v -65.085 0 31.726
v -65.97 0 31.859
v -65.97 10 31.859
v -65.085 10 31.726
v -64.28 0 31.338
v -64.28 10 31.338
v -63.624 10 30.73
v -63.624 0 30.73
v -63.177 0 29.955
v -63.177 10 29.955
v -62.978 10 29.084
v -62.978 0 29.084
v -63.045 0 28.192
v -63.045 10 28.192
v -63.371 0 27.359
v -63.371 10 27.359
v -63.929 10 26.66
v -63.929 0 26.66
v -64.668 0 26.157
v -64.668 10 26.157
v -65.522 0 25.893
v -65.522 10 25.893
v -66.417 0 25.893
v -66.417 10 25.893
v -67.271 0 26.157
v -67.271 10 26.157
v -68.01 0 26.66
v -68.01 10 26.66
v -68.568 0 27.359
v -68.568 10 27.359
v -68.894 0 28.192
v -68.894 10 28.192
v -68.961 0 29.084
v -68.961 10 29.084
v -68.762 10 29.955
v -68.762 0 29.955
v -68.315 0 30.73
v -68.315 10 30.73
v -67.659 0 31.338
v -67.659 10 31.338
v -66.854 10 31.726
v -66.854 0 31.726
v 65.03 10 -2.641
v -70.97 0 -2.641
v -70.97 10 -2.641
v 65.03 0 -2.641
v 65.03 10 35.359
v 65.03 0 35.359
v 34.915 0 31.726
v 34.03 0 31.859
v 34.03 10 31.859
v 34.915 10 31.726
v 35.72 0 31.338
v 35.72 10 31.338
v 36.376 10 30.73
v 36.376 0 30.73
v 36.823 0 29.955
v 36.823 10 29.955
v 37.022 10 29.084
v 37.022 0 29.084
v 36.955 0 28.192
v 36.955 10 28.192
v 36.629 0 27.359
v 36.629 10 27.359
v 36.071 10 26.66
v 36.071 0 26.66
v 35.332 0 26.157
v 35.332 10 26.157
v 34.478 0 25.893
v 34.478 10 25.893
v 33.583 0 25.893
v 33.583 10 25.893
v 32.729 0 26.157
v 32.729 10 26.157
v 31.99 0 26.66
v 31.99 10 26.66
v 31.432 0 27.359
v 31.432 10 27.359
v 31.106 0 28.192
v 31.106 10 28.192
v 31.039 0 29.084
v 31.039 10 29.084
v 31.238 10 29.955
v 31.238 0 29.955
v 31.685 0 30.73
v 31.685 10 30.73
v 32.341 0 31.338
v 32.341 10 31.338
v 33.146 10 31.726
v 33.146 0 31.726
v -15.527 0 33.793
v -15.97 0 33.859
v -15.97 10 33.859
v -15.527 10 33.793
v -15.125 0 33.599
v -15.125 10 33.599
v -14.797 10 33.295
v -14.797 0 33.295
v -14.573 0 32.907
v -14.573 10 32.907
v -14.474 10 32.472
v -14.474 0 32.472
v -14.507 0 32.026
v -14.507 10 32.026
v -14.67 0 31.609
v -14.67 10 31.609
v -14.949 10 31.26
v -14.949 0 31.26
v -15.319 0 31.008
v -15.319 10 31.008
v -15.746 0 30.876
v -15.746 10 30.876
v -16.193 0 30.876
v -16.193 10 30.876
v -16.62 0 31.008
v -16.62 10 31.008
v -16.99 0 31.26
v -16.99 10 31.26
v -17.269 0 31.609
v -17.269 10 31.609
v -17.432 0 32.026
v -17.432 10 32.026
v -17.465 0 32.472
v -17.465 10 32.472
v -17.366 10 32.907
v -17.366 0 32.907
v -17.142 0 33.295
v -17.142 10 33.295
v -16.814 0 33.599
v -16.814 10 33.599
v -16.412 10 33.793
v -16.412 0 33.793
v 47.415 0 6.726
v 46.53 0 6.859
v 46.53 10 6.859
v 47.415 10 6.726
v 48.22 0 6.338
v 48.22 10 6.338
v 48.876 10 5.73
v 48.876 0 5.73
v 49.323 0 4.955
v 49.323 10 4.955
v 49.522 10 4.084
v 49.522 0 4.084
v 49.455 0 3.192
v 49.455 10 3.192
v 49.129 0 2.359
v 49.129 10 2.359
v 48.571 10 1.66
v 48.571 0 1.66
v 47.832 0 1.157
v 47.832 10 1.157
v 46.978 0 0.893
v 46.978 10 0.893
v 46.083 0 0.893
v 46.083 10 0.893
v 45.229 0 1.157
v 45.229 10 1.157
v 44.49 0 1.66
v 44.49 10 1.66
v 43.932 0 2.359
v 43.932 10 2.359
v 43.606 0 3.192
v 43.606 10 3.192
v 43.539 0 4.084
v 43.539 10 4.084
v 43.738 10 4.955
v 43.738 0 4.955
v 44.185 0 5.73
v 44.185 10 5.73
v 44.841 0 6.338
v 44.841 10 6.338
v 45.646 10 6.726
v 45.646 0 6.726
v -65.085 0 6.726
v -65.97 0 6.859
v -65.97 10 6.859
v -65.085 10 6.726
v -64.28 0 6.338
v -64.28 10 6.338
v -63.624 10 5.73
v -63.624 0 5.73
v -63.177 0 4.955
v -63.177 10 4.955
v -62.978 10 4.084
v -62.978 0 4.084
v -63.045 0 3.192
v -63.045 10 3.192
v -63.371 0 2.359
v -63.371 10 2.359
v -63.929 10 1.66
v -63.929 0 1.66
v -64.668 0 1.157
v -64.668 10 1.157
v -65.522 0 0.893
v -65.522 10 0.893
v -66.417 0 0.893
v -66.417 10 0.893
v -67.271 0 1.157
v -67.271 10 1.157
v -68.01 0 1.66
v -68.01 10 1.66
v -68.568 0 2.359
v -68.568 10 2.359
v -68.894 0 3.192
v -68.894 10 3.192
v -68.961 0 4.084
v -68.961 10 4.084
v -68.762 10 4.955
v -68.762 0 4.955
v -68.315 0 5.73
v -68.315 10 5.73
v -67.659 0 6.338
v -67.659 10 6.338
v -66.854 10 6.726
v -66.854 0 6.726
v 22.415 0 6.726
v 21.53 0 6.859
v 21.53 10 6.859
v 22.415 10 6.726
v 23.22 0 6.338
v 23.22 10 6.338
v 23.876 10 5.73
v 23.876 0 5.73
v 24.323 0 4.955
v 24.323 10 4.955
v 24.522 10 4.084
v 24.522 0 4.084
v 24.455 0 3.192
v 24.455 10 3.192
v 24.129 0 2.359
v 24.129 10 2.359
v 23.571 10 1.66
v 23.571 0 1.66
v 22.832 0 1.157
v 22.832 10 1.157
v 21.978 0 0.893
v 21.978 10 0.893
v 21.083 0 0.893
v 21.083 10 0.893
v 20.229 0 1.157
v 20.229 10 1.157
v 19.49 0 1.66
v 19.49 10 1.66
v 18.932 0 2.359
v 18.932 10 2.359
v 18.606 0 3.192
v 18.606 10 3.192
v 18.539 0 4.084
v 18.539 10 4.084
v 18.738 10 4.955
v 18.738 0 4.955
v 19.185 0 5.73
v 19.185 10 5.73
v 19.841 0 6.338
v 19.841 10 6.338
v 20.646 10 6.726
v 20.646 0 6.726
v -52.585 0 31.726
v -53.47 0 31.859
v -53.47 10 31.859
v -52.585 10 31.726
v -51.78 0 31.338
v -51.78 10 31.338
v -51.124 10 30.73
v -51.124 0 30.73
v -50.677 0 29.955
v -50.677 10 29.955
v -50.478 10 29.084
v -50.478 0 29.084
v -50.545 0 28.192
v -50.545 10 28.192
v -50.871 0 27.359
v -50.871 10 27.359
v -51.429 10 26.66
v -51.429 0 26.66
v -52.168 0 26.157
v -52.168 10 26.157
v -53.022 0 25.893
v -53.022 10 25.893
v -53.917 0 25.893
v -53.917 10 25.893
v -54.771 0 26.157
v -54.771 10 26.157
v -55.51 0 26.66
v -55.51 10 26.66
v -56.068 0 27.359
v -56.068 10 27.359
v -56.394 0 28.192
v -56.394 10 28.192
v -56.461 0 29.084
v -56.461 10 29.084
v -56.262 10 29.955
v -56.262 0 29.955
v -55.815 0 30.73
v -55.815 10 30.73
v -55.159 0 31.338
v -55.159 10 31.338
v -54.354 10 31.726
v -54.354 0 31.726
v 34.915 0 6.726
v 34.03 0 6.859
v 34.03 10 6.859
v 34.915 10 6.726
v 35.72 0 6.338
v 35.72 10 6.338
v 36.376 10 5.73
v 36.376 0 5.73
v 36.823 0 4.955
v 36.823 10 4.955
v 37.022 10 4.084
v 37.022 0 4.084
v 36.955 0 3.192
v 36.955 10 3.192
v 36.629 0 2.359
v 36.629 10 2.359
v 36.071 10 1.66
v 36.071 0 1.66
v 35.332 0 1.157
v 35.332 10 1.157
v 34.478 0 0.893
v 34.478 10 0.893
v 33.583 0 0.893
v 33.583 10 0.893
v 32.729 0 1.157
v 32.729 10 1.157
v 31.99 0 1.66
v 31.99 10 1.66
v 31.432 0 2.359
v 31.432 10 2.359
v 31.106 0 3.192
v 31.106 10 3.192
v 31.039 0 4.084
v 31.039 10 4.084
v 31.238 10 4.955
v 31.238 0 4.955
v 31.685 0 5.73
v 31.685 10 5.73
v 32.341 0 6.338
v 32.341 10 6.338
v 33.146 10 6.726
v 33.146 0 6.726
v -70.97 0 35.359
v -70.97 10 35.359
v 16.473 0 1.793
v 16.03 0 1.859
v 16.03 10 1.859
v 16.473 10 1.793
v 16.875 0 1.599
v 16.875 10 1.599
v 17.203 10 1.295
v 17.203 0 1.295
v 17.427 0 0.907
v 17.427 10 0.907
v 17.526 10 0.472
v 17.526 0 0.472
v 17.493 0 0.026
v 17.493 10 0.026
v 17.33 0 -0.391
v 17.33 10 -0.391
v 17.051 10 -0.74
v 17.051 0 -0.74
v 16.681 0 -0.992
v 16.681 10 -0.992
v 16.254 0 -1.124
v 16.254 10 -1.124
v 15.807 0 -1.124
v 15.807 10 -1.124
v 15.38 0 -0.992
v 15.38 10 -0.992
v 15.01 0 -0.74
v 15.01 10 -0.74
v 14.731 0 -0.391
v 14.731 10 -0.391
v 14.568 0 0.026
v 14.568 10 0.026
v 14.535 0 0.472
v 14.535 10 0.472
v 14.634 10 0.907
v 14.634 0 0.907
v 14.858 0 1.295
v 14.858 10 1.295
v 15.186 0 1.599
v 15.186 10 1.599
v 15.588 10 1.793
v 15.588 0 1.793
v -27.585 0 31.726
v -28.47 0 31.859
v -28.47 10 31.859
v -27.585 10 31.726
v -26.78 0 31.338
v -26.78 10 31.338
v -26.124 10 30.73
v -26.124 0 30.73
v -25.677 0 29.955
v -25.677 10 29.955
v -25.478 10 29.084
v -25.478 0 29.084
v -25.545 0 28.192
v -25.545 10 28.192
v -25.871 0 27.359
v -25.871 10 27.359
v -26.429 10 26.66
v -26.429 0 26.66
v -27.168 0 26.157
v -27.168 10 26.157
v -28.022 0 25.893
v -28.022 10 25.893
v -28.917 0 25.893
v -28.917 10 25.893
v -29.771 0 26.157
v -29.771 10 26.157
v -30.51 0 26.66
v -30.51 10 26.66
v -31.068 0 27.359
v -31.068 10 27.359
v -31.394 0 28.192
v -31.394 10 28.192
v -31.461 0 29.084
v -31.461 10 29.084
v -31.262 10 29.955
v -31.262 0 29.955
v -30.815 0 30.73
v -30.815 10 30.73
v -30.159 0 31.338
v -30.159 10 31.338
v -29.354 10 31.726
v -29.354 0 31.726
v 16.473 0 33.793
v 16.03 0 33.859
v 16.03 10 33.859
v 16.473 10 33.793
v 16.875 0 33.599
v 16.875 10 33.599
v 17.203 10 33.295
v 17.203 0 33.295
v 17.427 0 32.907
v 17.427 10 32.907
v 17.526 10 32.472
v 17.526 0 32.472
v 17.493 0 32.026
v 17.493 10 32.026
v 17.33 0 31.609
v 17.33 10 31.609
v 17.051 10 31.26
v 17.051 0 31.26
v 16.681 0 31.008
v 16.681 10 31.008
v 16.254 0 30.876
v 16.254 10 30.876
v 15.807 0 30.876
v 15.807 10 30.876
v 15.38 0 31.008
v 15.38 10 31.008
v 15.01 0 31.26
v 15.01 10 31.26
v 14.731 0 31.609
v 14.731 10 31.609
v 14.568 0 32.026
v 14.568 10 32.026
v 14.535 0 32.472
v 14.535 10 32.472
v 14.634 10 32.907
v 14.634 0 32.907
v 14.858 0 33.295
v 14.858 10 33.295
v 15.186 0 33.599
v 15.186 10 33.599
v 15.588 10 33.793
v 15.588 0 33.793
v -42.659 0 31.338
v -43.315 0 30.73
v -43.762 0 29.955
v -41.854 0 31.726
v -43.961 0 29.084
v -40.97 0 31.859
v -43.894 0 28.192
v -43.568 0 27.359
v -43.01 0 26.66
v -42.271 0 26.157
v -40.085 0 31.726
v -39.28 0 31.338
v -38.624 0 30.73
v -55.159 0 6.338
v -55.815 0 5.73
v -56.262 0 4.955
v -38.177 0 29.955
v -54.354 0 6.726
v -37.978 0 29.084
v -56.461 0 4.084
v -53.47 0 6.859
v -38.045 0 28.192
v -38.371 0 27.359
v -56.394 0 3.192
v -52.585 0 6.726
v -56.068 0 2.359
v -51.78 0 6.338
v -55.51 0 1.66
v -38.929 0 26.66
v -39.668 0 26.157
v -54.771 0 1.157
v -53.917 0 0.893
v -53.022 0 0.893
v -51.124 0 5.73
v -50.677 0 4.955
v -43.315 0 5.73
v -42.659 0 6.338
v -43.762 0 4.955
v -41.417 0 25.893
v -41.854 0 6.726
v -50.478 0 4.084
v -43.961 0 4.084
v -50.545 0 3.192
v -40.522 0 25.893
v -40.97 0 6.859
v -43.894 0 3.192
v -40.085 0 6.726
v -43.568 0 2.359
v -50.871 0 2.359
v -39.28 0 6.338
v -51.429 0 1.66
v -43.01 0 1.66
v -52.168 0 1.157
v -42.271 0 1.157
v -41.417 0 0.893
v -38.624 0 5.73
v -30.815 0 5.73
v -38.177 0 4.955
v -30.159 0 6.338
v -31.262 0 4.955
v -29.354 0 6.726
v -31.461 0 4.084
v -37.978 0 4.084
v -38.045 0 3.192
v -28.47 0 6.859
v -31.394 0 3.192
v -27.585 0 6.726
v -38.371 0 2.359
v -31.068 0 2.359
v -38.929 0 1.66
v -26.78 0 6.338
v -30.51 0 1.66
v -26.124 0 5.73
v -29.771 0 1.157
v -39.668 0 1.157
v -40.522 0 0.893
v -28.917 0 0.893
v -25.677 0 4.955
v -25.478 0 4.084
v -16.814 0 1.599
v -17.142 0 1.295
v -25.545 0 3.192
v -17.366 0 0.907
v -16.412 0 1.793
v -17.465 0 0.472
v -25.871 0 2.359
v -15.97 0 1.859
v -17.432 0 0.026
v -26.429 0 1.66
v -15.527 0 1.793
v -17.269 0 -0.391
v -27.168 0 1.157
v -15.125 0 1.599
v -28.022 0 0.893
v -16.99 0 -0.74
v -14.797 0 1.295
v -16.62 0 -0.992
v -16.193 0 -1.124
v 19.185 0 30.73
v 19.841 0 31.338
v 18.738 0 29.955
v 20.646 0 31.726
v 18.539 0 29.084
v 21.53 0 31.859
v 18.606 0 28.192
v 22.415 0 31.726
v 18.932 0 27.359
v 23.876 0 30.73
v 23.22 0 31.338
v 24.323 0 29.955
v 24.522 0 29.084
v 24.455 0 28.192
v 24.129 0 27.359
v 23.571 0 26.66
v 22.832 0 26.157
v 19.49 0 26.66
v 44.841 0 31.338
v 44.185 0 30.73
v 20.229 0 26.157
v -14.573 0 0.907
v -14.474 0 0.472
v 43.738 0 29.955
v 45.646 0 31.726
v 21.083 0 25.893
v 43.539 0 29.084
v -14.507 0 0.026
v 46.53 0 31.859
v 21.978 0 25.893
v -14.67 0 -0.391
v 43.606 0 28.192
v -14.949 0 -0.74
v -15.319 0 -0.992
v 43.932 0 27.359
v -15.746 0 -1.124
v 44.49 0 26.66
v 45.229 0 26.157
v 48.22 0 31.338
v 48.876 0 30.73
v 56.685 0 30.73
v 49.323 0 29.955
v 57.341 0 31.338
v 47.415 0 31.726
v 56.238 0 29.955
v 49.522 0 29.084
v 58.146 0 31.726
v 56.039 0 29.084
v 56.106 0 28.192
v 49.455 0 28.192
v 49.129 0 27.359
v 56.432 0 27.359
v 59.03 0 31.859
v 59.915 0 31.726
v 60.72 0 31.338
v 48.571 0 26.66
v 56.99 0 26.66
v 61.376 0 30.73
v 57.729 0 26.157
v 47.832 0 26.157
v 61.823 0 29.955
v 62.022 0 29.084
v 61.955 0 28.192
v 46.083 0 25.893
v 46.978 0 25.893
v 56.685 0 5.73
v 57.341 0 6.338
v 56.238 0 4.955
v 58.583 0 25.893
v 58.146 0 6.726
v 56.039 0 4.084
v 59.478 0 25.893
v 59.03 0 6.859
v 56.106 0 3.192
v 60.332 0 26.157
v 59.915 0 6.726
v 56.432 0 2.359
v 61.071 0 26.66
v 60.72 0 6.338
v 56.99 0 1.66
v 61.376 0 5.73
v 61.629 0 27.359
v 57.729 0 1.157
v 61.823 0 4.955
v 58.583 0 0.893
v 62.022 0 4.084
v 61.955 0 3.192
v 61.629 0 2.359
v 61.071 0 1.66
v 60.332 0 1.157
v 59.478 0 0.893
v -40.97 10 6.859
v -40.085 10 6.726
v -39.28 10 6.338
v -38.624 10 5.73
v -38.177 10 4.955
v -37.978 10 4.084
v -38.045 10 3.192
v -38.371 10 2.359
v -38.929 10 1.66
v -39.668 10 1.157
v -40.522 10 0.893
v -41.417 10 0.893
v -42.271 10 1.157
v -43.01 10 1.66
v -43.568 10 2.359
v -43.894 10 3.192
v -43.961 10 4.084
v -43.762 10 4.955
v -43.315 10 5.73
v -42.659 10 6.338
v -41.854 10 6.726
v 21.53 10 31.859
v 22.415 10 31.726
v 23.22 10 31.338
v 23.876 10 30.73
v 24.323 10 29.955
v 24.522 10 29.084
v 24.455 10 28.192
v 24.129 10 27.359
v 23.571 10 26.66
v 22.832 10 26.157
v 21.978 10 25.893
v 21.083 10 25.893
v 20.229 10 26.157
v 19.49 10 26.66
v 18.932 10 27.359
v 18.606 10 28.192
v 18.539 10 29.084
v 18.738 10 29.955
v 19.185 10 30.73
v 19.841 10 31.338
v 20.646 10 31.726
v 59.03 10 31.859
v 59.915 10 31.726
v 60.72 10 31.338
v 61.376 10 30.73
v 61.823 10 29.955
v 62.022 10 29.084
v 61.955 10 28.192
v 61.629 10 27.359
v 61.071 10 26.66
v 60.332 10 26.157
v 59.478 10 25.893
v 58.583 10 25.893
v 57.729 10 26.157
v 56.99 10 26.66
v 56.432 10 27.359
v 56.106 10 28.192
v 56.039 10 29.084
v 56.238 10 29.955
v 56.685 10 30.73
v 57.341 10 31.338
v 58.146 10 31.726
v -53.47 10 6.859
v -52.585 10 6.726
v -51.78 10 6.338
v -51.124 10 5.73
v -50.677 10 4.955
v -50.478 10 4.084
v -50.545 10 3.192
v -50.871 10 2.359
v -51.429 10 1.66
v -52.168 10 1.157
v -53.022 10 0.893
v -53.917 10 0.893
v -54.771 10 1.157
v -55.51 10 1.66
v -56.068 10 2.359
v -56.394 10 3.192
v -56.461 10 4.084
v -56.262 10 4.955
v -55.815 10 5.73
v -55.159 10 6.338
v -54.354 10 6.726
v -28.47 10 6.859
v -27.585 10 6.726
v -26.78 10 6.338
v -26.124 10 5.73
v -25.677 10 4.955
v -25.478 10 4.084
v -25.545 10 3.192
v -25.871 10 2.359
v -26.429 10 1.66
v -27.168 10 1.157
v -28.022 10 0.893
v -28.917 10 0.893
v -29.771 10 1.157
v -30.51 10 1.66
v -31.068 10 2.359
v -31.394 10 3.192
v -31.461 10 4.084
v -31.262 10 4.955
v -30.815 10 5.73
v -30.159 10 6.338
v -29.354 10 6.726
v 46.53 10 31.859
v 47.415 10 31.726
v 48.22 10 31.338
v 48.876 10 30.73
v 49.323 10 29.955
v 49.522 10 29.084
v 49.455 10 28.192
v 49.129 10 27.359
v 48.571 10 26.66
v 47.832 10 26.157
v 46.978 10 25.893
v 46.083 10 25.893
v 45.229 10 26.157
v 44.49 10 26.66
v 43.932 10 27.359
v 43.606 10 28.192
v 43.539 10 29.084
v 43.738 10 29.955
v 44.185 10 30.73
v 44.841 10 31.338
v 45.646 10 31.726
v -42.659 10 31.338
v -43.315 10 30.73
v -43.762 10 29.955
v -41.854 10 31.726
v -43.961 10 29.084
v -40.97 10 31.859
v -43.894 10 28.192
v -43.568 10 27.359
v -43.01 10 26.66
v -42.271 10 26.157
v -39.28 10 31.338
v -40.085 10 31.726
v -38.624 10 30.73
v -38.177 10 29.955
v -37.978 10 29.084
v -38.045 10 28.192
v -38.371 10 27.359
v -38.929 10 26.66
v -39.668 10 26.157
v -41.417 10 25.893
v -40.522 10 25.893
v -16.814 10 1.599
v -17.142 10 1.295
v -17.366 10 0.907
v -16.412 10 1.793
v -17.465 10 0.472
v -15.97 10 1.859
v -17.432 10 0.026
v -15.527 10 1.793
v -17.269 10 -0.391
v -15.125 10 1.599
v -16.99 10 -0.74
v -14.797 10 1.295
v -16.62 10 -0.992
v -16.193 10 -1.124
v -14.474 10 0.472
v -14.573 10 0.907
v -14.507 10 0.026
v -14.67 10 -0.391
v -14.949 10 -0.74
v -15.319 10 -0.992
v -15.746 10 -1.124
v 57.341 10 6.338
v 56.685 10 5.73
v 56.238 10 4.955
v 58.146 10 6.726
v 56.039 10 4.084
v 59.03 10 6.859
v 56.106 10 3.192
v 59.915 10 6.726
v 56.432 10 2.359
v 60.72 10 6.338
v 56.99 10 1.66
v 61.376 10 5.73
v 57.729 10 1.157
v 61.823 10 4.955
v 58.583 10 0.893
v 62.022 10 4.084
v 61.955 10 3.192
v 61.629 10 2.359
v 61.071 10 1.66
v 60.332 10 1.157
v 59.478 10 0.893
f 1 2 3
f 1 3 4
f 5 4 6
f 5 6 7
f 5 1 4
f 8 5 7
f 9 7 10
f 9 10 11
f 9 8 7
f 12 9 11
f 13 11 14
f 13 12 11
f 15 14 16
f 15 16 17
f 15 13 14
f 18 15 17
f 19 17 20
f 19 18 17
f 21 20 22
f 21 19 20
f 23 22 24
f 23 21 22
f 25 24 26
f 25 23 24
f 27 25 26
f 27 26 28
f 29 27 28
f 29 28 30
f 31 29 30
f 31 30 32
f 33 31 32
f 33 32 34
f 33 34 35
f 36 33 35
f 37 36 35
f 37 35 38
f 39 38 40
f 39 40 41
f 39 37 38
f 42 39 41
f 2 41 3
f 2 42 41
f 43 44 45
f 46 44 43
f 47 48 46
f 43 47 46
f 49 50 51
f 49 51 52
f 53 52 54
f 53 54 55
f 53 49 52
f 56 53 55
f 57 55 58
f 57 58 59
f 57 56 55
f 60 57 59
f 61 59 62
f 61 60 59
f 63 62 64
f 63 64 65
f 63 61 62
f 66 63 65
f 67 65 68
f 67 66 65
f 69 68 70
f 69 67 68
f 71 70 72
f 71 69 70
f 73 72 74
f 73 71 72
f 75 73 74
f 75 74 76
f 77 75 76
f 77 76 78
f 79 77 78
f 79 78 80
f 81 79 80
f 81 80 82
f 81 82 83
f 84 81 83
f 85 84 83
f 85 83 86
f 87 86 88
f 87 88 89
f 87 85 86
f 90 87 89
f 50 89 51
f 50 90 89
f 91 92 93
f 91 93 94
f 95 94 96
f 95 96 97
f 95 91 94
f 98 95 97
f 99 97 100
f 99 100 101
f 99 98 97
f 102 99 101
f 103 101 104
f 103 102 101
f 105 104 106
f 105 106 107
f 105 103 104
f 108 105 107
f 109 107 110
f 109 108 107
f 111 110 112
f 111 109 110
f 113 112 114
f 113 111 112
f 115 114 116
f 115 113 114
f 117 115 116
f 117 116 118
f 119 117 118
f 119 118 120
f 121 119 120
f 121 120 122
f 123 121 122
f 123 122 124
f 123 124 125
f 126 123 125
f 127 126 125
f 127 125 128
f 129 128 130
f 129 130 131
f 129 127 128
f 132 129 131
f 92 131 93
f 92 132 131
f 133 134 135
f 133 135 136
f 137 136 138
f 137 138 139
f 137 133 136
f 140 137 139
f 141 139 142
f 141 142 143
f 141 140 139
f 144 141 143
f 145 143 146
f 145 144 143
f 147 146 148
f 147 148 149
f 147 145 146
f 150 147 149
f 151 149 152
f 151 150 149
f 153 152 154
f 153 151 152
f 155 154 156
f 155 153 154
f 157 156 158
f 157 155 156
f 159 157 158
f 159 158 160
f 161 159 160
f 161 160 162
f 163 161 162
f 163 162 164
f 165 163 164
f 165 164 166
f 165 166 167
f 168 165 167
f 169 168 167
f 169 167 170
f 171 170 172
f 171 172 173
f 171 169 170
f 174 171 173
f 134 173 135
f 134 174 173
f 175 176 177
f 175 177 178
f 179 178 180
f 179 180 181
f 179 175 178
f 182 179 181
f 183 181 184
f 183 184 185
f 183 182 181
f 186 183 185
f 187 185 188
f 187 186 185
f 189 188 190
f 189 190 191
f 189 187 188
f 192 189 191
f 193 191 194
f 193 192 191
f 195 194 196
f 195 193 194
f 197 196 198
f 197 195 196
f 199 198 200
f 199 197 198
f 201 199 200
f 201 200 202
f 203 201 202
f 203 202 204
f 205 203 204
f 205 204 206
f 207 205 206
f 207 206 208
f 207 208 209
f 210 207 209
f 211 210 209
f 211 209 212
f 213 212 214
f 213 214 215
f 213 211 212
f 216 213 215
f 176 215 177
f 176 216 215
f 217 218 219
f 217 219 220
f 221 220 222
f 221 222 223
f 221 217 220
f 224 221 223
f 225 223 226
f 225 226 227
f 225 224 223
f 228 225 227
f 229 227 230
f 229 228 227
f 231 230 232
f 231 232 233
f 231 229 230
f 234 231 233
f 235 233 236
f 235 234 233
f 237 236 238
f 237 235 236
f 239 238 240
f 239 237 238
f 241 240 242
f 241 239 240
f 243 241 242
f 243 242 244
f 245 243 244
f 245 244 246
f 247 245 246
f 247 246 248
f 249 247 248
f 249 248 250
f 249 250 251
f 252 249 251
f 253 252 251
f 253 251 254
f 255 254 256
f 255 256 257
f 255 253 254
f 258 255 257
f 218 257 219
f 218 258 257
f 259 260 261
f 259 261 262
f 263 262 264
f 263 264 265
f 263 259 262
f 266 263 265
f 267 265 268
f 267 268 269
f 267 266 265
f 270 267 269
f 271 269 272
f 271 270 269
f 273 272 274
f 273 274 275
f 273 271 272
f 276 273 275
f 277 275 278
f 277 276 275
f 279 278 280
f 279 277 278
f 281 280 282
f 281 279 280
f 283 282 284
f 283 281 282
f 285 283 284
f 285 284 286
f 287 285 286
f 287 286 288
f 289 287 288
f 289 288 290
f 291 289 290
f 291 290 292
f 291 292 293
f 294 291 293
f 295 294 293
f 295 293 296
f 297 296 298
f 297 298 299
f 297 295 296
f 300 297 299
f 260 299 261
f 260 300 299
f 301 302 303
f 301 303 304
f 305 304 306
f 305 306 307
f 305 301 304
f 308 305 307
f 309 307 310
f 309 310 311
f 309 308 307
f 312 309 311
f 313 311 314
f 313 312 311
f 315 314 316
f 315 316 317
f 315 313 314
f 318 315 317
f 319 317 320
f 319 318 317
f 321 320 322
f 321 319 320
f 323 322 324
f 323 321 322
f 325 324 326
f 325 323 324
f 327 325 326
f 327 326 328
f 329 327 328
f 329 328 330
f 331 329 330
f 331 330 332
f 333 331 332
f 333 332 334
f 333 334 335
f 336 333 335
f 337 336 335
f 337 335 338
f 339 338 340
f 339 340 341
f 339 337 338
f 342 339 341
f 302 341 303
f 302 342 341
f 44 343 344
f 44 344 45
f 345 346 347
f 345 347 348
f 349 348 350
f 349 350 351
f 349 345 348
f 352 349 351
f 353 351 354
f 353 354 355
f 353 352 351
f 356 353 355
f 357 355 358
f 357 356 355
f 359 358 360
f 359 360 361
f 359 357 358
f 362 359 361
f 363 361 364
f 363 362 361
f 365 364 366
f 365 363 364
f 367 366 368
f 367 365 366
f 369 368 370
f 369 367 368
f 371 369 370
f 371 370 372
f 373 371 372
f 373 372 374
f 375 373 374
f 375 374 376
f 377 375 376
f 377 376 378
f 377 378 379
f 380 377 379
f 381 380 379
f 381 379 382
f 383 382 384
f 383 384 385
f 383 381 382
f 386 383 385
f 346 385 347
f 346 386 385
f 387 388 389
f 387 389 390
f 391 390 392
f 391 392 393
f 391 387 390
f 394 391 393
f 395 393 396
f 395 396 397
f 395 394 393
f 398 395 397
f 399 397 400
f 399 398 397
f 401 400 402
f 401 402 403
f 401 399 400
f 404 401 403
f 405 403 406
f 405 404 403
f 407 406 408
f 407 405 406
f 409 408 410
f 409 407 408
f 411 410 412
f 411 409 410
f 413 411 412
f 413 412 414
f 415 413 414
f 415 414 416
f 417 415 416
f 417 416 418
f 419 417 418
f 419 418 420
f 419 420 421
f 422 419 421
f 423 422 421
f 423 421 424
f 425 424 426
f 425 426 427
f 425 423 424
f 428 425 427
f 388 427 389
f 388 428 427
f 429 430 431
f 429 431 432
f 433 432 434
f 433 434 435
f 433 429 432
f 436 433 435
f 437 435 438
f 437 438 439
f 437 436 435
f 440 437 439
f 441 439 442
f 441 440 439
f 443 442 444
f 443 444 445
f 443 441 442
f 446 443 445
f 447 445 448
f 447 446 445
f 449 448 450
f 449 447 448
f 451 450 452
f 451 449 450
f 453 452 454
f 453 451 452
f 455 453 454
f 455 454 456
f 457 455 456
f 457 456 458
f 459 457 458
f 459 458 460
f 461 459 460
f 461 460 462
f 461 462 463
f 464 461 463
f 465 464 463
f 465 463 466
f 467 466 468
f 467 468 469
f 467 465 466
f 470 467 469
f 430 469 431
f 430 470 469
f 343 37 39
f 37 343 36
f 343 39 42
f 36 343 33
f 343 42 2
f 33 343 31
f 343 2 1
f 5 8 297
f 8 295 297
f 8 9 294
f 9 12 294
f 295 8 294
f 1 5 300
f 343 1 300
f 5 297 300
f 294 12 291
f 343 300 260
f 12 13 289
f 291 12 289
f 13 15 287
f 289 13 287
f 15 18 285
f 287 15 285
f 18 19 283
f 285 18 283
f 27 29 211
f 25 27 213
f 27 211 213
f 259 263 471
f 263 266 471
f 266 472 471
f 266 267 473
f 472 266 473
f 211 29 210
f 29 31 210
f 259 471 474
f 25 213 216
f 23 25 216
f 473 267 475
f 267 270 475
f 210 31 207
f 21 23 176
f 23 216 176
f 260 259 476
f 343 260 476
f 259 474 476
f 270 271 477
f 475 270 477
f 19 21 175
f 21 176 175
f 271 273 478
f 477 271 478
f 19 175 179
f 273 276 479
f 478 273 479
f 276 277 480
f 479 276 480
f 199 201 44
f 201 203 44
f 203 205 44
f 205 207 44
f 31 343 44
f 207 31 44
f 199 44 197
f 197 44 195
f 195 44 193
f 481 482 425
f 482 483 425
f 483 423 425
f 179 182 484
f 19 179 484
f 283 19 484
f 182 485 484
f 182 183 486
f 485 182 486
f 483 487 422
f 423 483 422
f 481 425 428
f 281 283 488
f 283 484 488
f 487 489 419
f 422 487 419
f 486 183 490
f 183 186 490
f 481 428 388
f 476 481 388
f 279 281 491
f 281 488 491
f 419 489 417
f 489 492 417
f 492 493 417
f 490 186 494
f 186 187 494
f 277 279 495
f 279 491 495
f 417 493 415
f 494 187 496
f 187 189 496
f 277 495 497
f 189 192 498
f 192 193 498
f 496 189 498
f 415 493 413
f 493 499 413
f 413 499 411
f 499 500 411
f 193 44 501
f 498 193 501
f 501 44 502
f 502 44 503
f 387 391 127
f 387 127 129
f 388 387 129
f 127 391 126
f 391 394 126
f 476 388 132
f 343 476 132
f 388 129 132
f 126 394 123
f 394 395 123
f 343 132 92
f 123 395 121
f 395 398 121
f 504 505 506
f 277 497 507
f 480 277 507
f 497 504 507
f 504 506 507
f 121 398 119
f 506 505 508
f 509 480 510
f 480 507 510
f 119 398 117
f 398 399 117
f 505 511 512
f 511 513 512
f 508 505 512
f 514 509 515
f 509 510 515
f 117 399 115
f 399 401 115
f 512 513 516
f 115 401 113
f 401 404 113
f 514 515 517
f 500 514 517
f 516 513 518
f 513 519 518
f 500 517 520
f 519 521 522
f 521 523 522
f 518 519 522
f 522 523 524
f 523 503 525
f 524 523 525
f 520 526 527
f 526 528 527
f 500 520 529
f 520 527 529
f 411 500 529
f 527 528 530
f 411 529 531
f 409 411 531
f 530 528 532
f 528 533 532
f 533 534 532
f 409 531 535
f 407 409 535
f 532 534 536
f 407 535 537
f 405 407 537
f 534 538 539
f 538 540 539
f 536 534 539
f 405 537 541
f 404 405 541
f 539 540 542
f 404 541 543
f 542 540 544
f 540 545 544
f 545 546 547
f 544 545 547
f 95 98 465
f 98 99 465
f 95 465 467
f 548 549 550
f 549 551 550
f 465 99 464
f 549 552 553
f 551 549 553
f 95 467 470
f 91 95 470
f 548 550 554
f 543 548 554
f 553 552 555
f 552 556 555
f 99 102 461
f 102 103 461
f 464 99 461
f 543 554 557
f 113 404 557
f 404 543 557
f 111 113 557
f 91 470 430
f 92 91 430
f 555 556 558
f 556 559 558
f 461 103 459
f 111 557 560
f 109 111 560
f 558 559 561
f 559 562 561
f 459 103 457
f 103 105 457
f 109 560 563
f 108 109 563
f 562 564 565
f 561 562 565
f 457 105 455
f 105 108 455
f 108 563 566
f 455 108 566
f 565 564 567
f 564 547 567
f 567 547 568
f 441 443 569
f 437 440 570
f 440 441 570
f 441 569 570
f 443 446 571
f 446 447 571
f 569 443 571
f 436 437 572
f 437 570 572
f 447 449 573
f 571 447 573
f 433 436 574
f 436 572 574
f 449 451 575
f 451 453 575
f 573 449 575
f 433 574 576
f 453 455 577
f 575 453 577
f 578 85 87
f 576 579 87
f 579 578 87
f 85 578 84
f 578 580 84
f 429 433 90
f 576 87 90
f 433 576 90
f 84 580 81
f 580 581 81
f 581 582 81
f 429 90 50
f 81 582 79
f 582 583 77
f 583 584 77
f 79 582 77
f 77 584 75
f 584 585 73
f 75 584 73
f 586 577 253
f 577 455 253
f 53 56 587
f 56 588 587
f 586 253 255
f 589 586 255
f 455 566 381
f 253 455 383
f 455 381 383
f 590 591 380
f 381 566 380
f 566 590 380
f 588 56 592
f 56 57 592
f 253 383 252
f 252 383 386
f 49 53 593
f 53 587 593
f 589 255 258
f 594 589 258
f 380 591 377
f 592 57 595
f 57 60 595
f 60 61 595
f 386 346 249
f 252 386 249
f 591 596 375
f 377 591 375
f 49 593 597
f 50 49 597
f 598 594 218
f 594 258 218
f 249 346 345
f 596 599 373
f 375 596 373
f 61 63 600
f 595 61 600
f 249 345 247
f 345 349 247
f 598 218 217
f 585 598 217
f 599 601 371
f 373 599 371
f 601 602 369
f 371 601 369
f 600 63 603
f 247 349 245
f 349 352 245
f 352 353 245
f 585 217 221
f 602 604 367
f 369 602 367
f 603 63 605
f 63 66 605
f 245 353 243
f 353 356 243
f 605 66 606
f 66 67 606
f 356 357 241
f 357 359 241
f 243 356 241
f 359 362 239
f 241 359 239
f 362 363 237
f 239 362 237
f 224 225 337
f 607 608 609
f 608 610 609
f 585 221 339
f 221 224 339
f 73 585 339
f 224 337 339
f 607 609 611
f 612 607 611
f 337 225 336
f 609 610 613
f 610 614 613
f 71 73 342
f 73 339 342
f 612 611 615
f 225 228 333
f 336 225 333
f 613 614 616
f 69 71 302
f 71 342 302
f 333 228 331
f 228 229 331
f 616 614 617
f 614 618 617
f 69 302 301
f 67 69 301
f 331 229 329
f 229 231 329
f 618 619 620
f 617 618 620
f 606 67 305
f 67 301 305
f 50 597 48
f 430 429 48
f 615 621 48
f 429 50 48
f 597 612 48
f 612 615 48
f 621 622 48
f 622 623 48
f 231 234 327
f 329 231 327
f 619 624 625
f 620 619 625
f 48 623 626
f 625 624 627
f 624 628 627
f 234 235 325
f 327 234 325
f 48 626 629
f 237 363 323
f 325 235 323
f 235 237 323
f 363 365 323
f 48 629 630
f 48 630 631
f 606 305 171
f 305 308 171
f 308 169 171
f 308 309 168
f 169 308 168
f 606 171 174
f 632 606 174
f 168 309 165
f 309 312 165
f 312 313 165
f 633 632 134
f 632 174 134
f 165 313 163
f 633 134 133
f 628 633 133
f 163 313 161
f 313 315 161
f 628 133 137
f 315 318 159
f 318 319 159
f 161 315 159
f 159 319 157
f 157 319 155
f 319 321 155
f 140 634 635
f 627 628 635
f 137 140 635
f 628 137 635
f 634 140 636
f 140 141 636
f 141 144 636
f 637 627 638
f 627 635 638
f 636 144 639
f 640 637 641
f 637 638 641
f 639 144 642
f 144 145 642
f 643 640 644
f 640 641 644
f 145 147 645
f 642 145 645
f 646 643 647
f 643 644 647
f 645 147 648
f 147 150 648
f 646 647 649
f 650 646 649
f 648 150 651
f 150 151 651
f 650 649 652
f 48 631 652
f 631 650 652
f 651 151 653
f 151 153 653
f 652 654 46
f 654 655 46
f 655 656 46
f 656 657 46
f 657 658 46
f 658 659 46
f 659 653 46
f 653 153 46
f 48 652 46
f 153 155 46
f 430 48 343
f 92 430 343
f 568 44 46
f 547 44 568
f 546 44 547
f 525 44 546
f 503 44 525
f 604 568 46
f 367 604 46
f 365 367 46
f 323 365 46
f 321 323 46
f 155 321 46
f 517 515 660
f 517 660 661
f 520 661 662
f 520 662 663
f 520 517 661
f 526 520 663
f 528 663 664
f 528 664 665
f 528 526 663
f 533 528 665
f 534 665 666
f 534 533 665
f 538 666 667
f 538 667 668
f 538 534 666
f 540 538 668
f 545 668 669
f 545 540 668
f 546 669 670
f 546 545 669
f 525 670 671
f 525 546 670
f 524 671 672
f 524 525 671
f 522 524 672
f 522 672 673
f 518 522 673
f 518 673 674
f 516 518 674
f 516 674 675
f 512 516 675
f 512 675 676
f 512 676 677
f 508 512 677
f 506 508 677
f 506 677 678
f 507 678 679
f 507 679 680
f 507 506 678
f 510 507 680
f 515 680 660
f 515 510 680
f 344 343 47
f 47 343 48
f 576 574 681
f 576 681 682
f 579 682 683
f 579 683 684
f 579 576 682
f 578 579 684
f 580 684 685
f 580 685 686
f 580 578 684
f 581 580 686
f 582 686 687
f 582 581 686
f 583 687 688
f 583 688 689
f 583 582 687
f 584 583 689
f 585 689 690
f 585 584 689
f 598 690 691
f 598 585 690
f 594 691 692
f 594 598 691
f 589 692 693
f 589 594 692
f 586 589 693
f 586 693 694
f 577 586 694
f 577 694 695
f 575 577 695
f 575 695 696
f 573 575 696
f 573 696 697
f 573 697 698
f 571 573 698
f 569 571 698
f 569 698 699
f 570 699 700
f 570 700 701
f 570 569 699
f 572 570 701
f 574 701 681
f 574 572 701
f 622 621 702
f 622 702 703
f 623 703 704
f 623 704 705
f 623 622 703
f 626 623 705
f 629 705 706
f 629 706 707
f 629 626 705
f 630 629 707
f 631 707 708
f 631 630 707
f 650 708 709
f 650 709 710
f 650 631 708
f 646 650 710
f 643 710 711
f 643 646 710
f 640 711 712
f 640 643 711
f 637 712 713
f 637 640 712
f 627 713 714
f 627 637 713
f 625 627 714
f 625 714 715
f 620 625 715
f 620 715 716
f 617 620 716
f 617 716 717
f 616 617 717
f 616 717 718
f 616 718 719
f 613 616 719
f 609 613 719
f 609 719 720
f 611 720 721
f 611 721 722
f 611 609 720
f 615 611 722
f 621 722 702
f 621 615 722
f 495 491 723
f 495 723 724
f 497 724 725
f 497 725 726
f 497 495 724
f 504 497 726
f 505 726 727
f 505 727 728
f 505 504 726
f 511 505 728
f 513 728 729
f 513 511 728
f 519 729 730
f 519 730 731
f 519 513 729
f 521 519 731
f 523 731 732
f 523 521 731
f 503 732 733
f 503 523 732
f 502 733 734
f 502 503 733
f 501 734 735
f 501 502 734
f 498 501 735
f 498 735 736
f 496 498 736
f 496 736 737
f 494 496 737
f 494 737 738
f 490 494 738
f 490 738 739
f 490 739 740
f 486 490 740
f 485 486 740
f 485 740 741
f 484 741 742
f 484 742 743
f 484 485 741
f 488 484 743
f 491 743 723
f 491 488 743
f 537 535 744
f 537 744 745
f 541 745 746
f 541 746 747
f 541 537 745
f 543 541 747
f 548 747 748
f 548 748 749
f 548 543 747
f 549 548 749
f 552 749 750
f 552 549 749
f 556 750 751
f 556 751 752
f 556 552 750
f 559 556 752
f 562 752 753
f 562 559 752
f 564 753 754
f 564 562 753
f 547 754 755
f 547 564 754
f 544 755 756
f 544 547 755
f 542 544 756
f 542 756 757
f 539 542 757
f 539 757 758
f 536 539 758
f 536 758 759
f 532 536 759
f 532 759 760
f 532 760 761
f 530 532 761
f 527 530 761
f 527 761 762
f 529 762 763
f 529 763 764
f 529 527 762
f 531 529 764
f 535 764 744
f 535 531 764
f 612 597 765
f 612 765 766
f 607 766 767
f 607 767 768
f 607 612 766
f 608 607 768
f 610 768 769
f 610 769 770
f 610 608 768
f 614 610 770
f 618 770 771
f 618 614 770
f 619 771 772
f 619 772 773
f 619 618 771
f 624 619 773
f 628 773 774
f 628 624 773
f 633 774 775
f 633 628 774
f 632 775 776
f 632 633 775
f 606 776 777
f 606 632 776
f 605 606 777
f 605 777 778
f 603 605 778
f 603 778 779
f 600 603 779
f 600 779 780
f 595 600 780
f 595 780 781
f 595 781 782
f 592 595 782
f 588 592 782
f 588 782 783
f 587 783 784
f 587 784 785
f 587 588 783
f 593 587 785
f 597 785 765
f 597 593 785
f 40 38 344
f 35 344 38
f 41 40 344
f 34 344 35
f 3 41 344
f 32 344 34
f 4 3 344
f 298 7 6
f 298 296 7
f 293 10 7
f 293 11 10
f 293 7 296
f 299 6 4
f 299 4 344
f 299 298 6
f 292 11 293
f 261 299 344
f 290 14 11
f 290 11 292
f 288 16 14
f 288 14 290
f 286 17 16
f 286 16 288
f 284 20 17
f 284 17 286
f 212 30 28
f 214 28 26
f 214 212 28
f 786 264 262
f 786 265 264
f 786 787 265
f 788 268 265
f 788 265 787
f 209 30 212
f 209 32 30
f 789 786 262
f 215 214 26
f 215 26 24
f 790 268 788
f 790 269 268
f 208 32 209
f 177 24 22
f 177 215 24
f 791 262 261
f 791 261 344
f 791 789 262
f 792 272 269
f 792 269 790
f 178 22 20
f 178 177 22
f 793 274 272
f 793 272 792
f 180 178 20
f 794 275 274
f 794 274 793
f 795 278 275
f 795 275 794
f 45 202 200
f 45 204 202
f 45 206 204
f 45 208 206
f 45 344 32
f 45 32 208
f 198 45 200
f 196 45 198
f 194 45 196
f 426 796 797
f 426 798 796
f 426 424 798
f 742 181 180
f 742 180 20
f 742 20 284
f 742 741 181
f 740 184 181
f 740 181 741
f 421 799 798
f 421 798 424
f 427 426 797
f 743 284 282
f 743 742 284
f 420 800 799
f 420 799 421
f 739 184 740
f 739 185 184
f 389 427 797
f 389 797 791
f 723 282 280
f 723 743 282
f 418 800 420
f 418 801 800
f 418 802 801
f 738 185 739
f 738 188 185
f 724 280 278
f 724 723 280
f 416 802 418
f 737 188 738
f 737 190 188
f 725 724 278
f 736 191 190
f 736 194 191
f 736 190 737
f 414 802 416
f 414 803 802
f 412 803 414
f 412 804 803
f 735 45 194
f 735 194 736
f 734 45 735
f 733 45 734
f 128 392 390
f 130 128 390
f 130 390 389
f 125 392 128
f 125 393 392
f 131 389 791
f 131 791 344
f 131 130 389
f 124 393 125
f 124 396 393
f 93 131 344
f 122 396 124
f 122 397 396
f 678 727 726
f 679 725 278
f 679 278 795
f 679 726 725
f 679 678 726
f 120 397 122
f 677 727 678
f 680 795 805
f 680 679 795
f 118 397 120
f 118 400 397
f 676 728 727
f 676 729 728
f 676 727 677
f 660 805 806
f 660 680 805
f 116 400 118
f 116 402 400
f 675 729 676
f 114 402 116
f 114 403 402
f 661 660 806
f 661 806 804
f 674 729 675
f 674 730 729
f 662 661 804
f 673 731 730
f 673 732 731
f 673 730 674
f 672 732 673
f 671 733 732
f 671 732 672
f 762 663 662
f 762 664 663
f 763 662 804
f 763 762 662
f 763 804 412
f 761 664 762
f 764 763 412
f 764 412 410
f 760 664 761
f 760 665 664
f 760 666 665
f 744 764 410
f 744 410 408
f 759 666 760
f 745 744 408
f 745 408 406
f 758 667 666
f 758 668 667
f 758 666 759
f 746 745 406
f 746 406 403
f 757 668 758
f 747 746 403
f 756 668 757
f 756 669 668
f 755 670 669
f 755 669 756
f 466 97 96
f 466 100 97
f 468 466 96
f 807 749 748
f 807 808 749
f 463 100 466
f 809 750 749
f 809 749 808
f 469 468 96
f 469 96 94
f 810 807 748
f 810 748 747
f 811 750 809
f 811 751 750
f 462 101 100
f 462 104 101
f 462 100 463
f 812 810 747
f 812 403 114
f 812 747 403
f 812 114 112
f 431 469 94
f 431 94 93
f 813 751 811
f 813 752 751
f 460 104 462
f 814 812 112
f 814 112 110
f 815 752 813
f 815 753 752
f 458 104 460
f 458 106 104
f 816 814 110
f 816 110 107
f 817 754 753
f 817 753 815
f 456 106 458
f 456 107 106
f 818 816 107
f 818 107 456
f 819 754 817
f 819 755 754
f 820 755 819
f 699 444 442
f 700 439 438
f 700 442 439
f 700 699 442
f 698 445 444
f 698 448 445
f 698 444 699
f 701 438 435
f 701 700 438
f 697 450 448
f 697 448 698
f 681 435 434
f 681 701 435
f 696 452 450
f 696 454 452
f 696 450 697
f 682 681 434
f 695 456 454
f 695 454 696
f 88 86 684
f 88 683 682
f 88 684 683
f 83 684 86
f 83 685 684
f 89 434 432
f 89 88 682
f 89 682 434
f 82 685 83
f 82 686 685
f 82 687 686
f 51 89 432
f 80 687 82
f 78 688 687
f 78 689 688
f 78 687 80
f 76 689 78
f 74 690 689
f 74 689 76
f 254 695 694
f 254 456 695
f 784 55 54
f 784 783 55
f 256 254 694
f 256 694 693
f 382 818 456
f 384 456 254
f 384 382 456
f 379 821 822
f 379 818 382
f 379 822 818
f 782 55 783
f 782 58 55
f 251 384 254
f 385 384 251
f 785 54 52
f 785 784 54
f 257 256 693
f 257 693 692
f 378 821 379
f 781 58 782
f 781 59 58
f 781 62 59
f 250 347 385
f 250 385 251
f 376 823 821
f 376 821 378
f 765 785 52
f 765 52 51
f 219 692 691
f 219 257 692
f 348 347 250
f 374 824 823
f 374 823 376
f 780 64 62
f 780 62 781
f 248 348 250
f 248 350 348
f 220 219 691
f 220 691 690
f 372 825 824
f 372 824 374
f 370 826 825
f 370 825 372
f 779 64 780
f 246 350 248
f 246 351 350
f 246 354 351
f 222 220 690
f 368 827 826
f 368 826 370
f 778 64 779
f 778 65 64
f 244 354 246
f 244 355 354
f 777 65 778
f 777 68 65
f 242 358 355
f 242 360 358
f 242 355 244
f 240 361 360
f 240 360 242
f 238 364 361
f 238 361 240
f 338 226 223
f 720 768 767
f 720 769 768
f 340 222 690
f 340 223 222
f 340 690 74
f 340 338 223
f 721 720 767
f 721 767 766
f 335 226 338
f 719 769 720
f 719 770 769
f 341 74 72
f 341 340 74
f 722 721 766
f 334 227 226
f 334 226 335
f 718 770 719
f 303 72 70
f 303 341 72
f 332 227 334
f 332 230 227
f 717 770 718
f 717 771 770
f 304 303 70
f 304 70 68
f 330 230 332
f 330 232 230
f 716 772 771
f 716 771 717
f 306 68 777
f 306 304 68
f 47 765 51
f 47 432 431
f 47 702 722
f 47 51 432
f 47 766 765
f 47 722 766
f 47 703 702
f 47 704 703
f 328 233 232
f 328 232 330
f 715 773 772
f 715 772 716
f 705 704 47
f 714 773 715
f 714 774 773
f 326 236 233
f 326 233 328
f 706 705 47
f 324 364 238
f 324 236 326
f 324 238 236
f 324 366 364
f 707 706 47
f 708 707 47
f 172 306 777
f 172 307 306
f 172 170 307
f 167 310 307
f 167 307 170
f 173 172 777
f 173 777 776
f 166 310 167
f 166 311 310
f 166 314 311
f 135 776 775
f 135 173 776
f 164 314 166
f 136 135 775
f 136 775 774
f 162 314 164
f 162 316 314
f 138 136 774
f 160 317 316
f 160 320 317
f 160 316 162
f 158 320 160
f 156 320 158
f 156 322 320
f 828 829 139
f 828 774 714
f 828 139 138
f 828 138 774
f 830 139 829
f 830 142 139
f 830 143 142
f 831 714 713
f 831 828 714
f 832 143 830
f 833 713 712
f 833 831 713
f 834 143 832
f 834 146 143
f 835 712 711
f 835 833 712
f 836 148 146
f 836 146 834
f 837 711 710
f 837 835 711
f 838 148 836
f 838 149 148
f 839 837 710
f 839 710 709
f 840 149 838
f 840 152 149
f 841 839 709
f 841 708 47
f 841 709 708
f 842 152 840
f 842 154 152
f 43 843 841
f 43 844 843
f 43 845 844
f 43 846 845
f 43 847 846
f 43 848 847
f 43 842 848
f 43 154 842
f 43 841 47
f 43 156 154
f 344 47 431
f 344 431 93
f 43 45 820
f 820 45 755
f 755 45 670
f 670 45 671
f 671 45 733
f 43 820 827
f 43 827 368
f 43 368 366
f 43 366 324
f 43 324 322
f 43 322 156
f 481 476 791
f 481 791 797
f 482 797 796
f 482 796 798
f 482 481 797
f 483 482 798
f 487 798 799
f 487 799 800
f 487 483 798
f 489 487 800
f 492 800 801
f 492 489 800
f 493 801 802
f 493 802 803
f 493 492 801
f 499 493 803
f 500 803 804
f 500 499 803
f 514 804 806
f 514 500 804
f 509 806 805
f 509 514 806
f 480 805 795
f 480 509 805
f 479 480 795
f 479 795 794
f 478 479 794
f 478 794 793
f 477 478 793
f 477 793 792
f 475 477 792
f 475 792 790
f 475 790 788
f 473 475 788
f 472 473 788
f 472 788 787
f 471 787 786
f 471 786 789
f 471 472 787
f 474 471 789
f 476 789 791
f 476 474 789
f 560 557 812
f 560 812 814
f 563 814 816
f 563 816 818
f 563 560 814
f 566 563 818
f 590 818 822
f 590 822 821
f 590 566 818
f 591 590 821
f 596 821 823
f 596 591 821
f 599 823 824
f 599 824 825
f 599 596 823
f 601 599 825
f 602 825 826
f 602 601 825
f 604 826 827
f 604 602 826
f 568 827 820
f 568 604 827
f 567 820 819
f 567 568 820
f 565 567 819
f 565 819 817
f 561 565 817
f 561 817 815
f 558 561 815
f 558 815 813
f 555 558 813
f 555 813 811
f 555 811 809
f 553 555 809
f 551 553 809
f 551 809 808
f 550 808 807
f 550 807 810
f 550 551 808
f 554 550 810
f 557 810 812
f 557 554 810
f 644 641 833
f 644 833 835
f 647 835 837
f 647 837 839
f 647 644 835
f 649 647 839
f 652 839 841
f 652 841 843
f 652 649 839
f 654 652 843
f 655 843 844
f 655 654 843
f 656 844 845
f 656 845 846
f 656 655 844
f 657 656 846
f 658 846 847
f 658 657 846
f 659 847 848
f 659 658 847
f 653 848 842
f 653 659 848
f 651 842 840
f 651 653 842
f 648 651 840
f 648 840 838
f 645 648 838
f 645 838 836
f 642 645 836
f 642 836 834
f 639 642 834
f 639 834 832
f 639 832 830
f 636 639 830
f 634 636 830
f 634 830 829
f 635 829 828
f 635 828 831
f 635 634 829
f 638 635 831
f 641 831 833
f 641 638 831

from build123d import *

# Parameters (mm, degrees)
SKETCH1_W           = 136
SKETCH1_H           = 38
SKETCH1_R           = 1.5
SKETCH1_R_2         = 3
BOSS_EXTRUDE1_DEPTH = 10


with BuildPart() as part:
    # Sketch1 → Boss-Extrude1 (new body)
    with BuildSketch(Plane(origin=(0, 0, 0), x_dir=(1, 0, 0), z_dir=(0, 1, 0))):
        with Locations((-2.969502184, -16.359463259)):
            Rectangle(SKETCH1_W, SKETCH1_H)
        with Locations(Location((-15.969502184, -0.359463259, 0), (0, 0, 270))):
            Circle(SKETCH1_R, mode=Mode.SUBTRACT)
        with Locations(Location((16.030497816, -0.359463259, 0), (0, 0, 270))):
            Circle(SKETCH1_R, mode=Mode.SUBTRACT)
        with Locations(Location((16.030497816, -32.359463259, 0), (0, 0, 270))):
            Circle(SKETCH1_R, mode=Mode.SUBTRACT)
        with Locations(Location((-15.969502184, -32.359463259, 0), (0, 0, 270))):
            Circle(SKETCH1_R, mode=Mode.SUBTRACT)
        with Locations(Location((-65.969502184, -3.859463259, 0), (0, 0, 270))):
            Circle(SKETCH1_R_2, mode=Mode.SUBTRACT)
        with Locations(Location((-40.969502184, -3.859463259, 0), (0, 0, 270))):
            Circle(SKETCH1_R_2, mode=Mode.SUBTRACT)
        with Locations(Location((-40.969502184, -28.859463259, 0), (0, 0, 270))):
            Circle(SKETCH1_R_2, mode=Mode.SUBTRACT)
        with Locations(Location((-65.969502184, -28.859463259, 0), (0, 0, 270))):
            Circle(SKETCH1_R_2, mode=Mode.SUBTRACT)
        with Locations(Location((-28.469502184, -28.859463259, 0), (0, 0, 270))):
            Circle(SKETCH1_R_2, mode=Mode.SUBTRACT)
        with Locations(Location((-53.469502184, -3.859463259, 0), (0, 0, 270))):
            Circle(SKETCH1_R_2, mode=Mode.SUBTRACT)
        with Locations(Location((-53.469502184, -28.859463259, 0), (0, 0, 270))):
            Circle(SKETCH1_R_2, mode=Mode.SUBTRACT)
        with Locations(Location((-28.469502184, -3.859463259, 0), (0, 0, 270))):
            Circle(SKETCH1_R_2, mode=Mode.SUBTRACT)
        with Locations(Location((34.030497816, -3.859463259, 0), (0, 0, 270))):
            Circle(SKETCH1_R_2, mode=Mode.SUBTRACT)
        with Locations(Location((59.030497816, -28.859463259, 0), (0, 0, 270))):
            Circle(SKETCH1_R_2, mode=Mode.SUBTRACT)
        with Locations(Location((59.030497816, -3.859463259, 0), (0, 0, 270))):
            Circle(SKETCH1_R_2, mode=Mode.SUBTRACT)
        with Locations(Location((34.030497816, -28.859463259, 0), (0, 0, 270))):
            Circle(SKETCH1_R_2, mode=Mode.SUBTRACT)
        with Locations(Location((21.530497816, -28.859463259, 0), (0, 0, 270))):
            Circle(SKETCH1_R_2, mode=Mode.SUBTRACT)
        with Locations(Location((46.530497816, -28.859463259, 0), (0, 0, 270))):
            Circle(SKETCH1_R_2, mode=Mode.SUBTRACT)
        with Locations(Location((21.530497816, -3.859463259, 0), (0, 0, 270))):
            Circle(SKETCH1_R_2, mode=Mode.SUBTRACT)
        with Locations(Location((46.530497816, -3.859463259, 0), (0, 0, 270))):
            Circle(SKETCH1_R_2, mode=Mode.SUBTRACT)
    extrude(amount=BOSS_EXTRUDE1_DEPTH)


solid = part.part
